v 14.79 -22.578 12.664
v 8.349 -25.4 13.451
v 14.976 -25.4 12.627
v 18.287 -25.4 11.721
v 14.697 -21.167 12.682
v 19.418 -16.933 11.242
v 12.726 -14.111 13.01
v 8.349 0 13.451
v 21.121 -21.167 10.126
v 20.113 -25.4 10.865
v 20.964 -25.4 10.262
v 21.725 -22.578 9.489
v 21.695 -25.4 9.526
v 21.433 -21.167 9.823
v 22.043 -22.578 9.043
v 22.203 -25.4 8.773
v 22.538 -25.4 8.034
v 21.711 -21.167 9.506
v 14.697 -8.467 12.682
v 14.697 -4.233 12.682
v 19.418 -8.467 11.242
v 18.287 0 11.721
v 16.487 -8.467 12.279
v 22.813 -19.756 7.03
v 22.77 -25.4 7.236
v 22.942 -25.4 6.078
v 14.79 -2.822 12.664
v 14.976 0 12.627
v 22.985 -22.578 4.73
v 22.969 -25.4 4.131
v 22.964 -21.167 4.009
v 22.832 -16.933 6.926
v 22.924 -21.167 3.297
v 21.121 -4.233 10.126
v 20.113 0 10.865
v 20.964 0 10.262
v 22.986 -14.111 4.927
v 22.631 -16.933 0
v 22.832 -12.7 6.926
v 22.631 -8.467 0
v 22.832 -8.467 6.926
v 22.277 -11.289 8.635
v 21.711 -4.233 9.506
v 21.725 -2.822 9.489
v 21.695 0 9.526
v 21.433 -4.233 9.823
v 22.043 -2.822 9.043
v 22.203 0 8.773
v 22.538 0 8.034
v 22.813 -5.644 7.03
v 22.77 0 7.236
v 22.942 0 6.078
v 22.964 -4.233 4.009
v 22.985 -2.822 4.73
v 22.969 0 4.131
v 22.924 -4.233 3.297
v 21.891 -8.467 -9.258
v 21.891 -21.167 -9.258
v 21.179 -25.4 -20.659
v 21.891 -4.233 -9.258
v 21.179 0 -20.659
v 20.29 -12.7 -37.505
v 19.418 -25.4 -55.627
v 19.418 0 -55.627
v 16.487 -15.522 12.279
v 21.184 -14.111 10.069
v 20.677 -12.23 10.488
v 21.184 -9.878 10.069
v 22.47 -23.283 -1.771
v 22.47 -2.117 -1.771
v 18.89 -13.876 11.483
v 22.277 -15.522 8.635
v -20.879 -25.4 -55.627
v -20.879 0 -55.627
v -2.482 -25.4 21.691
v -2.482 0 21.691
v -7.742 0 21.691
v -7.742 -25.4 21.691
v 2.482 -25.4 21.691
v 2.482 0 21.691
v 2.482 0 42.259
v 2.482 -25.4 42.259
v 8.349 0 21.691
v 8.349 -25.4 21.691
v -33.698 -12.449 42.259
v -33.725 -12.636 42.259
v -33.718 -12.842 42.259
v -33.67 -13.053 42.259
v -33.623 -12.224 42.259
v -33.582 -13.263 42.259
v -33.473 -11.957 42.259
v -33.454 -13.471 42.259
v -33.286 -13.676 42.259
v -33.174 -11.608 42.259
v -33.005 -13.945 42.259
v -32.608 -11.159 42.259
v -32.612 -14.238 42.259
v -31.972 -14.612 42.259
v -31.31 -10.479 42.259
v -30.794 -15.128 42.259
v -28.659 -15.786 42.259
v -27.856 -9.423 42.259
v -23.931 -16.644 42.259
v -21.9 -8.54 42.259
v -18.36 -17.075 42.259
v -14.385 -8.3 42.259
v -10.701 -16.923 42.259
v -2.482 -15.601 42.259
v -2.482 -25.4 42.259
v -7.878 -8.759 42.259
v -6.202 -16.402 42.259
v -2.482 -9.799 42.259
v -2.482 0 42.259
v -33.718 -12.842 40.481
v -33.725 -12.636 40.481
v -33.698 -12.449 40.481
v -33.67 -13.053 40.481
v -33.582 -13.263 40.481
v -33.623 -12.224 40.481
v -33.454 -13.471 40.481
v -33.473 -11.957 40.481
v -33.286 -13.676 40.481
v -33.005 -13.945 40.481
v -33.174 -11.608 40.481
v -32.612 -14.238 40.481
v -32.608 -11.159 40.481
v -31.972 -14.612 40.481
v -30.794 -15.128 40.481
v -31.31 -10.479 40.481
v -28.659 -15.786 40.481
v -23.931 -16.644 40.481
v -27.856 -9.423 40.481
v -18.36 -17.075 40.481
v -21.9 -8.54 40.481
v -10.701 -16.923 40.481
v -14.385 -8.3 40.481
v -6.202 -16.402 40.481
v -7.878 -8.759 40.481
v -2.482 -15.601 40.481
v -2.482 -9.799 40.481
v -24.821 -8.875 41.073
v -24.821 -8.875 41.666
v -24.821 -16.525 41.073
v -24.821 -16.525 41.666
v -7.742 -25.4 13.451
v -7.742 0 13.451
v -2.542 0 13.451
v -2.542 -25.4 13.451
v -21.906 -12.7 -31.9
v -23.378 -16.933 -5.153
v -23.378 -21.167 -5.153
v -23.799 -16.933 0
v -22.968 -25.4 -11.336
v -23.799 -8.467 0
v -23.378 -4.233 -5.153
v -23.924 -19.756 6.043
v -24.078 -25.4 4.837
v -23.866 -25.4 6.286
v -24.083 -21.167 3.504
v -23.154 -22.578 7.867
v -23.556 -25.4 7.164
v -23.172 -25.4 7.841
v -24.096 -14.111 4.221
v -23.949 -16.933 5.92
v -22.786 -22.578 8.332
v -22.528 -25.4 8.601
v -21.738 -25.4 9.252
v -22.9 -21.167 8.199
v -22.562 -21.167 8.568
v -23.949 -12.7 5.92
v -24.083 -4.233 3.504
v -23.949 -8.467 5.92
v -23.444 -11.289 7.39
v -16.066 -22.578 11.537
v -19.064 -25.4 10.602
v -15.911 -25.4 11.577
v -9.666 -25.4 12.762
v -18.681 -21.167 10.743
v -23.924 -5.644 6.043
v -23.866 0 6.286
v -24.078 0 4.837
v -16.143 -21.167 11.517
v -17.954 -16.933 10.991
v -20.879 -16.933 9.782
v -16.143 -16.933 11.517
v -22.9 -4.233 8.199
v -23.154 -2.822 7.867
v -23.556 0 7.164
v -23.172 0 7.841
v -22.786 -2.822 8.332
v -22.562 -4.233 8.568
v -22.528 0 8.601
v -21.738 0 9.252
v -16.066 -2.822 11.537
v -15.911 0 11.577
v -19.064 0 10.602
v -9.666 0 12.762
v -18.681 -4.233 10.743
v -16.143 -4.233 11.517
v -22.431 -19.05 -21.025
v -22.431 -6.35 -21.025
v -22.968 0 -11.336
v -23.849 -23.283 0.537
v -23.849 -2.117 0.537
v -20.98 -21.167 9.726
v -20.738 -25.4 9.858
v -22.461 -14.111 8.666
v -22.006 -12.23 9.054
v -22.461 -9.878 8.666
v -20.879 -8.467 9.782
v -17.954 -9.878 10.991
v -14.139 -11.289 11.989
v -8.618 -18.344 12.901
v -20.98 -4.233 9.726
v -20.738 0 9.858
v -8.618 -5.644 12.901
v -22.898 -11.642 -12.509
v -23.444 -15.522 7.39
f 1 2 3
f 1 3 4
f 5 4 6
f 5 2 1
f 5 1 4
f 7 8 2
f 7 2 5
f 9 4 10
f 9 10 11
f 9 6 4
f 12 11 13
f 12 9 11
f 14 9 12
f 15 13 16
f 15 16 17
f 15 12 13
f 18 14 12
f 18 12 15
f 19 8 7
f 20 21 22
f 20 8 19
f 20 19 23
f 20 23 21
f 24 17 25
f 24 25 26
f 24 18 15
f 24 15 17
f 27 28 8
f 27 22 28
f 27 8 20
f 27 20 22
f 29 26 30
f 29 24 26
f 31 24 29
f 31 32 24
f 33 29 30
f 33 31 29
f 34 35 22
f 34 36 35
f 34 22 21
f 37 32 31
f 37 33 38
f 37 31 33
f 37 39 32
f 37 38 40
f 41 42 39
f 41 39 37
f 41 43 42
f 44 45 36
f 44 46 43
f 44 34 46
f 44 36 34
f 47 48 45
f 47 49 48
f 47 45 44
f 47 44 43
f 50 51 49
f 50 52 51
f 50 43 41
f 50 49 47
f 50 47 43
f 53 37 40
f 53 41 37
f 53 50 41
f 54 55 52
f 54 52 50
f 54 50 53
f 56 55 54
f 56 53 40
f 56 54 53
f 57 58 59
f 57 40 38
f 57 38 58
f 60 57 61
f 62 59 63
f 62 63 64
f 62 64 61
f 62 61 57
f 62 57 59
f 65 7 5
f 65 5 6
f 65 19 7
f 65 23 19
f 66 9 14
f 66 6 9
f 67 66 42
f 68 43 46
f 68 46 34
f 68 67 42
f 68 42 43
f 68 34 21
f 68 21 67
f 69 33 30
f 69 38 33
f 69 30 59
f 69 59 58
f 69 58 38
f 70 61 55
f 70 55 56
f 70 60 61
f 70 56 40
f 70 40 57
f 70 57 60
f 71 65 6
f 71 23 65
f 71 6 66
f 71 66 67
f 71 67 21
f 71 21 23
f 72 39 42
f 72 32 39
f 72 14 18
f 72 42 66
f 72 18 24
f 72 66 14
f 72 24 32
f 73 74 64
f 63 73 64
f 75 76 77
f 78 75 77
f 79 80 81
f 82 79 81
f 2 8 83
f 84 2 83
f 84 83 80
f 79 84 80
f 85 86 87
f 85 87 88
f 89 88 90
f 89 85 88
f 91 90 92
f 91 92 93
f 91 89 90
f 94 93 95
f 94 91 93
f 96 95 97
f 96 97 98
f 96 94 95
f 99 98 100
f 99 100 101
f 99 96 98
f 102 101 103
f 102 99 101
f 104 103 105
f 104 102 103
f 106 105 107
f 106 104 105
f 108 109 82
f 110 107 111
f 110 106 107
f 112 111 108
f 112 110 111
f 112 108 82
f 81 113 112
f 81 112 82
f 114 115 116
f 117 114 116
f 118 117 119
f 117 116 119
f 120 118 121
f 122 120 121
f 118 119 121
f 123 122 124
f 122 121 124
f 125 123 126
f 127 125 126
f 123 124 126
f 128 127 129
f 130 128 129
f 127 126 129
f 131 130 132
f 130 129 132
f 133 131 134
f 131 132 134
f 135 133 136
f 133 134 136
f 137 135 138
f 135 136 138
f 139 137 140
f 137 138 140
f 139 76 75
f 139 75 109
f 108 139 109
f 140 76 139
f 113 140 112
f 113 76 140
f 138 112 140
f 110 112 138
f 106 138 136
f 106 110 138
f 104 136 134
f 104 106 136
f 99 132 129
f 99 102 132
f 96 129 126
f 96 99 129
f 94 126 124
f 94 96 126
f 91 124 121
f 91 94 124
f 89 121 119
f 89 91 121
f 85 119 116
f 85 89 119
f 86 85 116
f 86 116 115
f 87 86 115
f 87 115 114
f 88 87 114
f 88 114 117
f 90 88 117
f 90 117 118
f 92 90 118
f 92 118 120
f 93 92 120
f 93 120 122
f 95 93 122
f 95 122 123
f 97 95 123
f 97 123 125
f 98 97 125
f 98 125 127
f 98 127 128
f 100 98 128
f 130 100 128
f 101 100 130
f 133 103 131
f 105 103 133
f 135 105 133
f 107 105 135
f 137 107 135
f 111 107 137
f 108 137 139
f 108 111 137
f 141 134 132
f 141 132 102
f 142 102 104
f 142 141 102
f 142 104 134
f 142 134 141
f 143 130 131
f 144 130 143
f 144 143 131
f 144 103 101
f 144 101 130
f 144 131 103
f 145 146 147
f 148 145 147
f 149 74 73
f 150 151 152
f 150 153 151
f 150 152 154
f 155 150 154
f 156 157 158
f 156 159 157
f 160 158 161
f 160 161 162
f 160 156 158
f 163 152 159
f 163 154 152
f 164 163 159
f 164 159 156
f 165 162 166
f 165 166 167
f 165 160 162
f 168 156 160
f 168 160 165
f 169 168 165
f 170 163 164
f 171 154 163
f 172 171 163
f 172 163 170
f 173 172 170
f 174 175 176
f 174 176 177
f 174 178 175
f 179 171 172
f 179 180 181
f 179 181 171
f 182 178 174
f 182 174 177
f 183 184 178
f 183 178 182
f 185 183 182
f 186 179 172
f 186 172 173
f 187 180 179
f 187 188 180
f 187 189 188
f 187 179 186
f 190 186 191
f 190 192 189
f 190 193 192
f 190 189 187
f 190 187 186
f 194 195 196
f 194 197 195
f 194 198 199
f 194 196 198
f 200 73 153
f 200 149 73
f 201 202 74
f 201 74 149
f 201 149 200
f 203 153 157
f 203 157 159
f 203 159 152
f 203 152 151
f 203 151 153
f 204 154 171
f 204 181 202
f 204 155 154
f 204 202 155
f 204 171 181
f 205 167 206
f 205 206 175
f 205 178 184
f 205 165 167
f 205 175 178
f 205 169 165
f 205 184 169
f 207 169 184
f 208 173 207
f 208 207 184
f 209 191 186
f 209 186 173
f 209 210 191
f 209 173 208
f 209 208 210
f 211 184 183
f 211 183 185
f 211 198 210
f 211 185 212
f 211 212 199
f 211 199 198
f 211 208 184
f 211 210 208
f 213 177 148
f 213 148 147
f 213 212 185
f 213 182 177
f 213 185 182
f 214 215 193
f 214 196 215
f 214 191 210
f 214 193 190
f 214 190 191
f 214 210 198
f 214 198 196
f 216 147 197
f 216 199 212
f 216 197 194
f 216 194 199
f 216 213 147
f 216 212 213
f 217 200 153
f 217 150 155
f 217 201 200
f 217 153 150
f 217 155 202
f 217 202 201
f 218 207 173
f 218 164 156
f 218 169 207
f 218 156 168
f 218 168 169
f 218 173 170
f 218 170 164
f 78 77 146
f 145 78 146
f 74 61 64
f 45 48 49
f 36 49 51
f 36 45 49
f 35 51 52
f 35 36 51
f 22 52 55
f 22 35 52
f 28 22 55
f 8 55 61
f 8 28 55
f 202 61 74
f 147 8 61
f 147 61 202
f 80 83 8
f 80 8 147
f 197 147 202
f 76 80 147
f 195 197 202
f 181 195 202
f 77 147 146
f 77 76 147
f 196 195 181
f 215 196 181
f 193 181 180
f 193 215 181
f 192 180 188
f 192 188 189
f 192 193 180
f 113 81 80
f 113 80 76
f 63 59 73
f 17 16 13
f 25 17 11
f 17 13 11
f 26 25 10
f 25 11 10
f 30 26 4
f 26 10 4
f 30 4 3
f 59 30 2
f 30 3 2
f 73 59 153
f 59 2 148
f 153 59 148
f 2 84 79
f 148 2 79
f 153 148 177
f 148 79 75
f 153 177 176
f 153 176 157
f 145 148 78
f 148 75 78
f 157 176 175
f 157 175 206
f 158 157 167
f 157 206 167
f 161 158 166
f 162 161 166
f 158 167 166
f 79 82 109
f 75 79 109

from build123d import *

# Parameters (mm, degrees)
F1_DEPTH = 25.4
F0_W     = 4.9641267397
F0_H     = 20.5680120253
F2_DEPTH = 25.4
F4_DEPTH = 1.778


with BuildPart() as f1:
    # F0 (on Front) → F1 (new body)
    with BuildSketch(Plane.XZ):
        with BuildLine():
            add(Edge.make_bspline(
                [(-2.5424052642, 13.4505262055), (1.1521358093, 13.6647690598), (4.9162748075, 13.6731126703), (8.3490842731, 13.4505262055)],
                knots=[0.4880703365, 0.4880703365, 0.4880703365, 0.4880703365, 0.5400106865, 0.5400106865, 0.5400106865, 0.5400106865], degree=3))
            Line((-2.5424052642, 13.4505262055), (8.3490842731, 13.4505262055))
        make_face()
    extrude(amount=F1_DEPTH)

    # F0 (on Front) → F2 (join)
    with BuildSketch(Plane.XZ):
        with BuildLine():
            add(Edge.make_bspline(
                [(-20.8785217255, -55.6273907423), (-21.8121267596, -33.4650030089), (-23.1454067557, -1.8149292086), (-25.1589760047, 10.3212946622), (-10.0779831552, 13.0135453506), (-2.5424052642, 13.4505262055)],
                knots=[0, 0, 0, 0, 0.2675796431, 0.3821301005, 0.4880703365, 0.4880703365, 0.4880703365, 0.4880703365], degree=3))
            Line((-20.8785217255, -55.6273907423), (19.4184854627, -55.6273907423))
            add(Edge.make_bspline(
                [(8.3490842731, 13.4505262055), (12.9609733748, 13.1514871526), (24.0264096091, 11.1780304821), (21.9504869715, -2.2184048812), (20.4485582955, -33.8994631834), (19.4184854627, -55.6273907423)],
                knots=[0.5400106865, 0.5400106865, 0.5400106865, 0.5400106865, 0.6097911787, 0.732381762, 1, 1, 1, 1], degree=3))
            Line((8.3490842731, 13.4505262055), (-2.5424052642, 13.4505262055))
        make_face()
        with BuildLine():
            Line((-7.7423275904, 13.4505262055), (-2.5424052642, 13.4505262055))
            add(Edge.make_bspline(
                [(-2.5424052642, 13.4505262055), (1.1521358093, 13.6647690598), (4.9162748075, 13.6731126703), (8.3490842731, 13.4505262055)],
                knots=[0.4880703365, 0.4880703365, 0.4880703365, 0.4880703365, 0.5400106865, 0.5400106865, 0.5400106865, 0.5400106865], degree=3))
            Line((8.3490842731, 13.4505262055), (8.3490842731, 21.6907939184))
            Line((8.3490842731, 21.6907939184), (2.4820633698, 21.6907939184))
            Line((2.4820633698, 21.6907939184), (-2.4820633698, 21.6907939184))
            Line((-2.4820633698, 21.6907939184), (-7.7423275904, 21.6907939184))
            Line((-7.7423275904, 21.6907939184), (-7.7423275904, 13.4505262055))
        make_face()
        with BuildLine():
            add(Edge.make_bspline(
                [(-2.5424052642, 13.4505262055), (1.1521358093, 13.6647690598), (4.9162748075, 13.6731126703), (8.3490842731, 13.4505262055)],
                knots=[0.4880703365, 0.4880703365, 0.4880703365, 0.4880703365, 0.5400106865, 0.5400106865, 0.5400106865, 0.5400106865], degree=3))
            Line((-2.5424052642, 13.4505262055), (8.3490842731, 13.4505262055))
        make_face()
        with Locations((0, 31.974799931)):
            Rectangle(F0_W, F0_H)
    extrude(amount=F2_DEPTH)

    # F3 (on face) → F4 (join)
    with BuildSketch(Plane.XY.offset(42.2588059437)):
        with BuildLine():
            add(Edge.make_bspline(
                [(1.8980501918, -12.7), (1.8980501918, -5.0506086184), (-24.8206210672, -8.8753043092), (-51.5392923262, -12.7), (-24.8206210672, -16.5246956908), (1.8980501918, -20.3493913816), (1.8980501918, -12.7)],
                knots=[0, 0, 0, 2.0943951024, 2.0943951024, 4.1887902048, 4.1887902048, 6.2831853072, 6.2831853072, 6.2831853072], degree=2, weights=[1, 0.5, 1, 0.5, 1, 0.5, 1]))
        make_face()
    extrude(amount=-F4_DEPTH)


solid = f1.part
